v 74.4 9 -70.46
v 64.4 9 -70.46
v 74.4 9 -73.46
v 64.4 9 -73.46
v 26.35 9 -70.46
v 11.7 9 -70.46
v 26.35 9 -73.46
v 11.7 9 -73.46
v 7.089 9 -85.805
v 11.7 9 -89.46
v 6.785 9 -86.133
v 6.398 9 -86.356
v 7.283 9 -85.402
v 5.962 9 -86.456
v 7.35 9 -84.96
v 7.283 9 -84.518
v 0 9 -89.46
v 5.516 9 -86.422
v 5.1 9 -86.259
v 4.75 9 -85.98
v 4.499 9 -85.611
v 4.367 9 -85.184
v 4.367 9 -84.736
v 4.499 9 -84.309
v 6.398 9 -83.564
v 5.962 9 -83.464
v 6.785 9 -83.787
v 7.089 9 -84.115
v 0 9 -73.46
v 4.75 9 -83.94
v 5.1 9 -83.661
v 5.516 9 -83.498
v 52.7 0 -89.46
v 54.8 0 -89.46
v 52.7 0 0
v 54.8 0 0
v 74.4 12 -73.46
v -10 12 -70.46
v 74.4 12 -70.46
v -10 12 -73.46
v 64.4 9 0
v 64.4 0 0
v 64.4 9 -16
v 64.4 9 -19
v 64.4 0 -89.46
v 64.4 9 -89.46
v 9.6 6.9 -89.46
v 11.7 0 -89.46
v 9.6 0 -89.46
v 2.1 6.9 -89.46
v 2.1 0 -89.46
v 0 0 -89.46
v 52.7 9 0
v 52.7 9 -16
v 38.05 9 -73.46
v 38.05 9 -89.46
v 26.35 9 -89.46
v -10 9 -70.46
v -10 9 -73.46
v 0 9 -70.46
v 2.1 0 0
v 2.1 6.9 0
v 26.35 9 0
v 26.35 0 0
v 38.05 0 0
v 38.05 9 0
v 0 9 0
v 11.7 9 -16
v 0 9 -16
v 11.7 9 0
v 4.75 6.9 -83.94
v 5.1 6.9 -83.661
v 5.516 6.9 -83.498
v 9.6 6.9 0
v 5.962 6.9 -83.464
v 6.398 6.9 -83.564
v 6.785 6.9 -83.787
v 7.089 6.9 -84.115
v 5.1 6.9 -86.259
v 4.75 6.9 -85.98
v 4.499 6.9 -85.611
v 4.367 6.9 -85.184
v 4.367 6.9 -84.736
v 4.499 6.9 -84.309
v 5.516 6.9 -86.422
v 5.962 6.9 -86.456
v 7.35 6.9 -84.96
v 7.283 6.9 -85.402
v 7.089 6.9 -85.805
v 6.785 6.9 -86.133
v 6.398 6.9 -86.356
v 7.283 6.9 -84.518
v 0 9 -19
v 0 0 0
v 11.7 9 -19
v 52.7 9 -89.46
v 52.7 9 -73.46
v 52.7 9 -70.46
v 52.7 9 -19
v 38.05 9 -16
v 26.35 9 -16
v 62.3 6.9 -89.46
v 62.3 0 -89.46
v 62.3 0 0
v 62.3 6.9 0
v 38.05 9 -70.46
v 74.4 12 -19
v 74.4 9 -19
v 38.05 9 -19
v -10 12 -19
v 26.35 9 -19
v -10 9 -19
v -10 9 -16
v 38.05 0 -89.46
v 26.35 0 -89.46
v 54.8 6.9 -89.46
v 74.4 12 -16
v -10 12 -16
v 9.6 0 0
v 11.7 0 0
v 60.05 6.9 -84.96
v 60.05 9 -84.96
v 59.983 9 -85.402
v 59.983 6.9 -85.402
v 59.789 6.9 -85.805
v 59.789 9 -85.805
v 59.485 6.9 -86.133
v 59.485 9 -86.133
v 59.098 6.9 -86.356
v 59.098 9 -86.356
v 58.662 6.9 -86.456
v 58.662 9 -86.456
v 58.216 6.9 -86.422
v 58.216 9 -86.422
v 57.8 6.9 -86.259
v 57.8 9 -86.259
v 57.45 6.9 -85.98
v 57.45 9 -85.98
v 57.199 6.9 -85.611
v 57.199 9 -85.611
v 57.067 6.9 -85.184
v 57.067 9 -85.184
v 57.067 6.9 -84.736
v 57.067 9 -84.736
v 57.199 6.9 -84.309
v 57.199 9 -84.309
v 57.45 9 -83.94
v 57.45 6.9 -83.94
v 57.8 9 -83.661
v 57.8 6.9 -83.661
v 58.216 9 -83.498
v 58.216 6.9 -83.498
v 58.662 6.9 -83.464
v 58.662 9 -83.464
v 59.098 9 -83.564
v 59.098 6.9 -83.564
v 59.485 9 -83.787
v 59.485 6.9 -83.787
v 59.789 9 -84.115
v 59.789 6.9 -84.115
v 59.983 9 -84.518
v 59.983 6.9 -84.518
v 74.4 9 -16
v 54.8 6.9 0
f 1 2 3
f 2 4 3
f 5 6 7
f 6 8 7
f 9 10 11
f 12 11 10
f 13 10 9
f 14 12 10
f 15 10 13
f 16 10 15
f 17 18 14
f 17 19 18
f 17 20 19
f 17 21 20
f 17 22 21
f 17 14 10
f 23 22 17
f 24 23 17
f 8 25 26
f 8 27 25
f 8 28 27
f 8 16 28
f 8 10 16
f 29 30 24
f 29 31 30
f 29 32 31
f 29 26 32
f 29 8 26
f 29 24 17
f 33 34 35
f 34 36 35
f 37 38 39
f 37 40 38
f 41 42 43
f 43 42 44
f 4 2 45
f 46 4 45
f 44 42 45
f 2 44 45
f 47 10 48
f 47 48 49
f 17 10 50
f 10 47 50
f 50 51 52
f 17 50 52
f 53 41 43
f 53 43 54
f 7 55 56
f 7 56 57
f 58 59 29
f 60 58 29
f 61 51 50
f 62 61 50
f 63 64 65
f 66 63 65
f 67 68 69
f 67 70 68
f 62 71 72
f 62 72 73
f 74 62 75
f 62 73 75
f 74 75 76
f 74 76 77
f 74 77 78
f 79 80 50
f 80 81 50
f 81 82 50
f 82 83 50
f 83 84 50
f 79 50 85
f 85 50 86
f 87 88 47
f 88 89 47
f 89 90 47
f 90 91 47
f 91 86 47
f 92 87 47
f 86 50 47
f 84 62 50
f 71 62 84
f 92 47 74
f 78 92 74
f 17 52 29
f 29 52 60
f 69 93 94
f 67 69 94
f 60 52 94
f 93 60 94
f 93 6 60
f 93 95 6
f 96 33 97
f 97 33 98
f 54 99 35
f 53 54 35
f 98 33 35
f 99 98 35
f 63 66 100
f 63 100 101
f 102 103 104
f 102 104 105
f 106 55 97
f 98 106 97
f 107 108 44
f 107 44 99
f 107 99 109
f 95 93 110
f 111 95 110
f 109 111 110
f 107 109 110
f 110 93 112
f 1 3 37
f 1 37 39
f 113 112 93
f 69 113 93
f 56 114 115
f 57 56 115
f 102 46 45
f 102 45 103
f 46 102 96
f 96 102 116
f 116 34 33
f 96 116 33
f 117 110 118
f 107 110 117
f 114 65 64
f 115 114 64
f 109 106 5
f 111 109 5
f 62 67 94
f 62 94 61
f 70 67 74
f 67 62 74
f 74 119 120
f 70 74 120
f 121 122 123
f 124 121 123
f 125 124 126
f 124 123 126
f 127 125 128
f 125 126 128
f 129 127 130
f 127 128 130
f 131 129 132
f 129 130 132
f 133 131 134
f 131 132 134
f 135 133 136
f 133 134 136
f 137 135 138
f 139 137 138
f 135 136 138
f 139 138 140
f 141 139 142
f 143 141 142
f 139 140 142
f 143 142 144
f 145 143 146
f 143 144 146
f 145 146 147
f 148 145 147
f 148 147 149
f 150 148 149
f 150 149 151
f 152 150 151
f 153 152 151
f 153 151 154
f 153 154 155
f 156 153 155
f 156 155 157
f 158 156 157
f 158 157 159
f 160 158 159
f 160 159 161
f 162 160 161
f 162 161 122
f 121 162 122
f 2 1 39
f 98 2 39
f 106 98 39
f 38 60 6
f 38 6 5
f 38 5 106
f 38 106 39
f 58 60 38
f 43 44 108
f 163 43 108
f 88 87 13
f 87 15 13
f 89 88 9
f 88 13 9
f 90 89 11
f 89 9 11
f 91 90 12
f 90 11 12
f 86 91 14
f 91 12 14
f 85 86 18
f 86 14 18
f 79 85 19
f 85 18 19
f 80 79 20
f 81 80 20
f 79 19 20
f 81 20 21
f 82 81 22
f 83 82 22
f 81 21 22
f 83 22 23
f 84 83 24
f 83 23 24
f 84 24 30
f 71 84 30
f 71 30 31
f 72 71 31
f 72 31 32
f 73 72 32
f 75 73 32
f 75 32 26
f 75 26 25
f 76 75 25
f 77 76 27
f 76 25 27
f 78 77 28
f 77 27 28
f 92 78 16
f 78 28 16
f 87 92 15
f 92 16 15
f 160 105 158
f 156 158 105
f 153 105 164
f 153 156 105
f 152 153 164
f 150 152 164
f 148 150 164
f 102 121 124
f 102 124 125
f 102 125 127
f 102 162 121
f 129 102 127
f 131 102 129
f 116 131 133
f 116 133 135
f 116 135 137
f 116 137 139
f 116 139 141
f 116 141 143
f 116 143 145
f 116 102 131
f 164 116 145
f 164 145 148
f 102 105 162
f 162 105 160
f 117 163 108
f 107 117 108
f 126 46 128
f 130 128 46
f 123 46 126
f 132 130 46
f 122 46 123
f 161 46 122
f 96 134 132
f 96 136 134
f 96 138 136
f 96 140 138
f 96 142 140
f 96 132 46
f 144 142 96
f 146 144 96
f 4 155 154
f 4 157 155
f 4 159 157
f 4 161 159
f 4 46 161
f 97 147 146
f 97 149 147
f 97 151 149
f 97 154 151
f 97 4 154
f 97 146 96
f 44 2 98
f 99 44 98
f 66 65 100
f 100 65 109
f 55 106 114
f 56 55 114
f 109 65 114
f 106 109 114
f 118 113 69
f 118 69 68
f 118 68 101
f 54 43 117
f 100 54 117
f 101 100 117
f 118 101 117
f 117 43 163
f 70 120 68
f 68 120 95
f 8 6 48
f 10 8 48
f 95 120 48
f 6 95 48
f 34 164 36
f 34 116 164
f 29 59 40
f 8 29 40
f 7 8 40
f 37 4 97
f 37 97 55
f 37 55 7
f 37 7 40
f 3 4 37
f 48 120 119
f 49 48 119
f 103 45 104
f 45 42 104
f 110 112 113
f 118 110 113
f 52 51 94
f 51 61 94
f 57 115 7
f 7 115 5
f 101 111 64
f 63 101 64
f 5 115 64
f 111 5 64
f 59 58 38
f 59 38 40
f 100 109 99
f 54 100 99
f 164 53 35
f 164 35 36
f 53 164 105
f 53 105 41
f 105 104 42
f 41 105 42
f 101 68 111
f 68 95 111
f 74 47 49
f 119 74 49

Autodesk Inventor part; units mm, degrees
ref_plane "YZ Plane" through (0, 0, 0) normal (1, 0, 0) x (0, 1, 0)
ref_plane "XZ Plane" through (0, 0, 0) normal (0, 1, 0) x (-1, 0, 0)
sketch "Sketch1" plane through (0, 0, 0) normal (0, 1, 0) x (-1, 0, 0)
  line L0 (0, 0) -> (-11.7, 0)
  line L1 (-11.7, 0) -> (-11.7, -89.46)
  line L2 (-11.7, -89.46) -> (0, -89.46)
  line L3 (0, -89.46) -> (0, 0)
  line L4 (-26.35, 0) -> (-38.05, 0)
  line L5 (-38.05, 0) -> (-38.05, -89.46)
  line L6 (-38.05, -89.46) -> (-26.35, -89.46)
  line L7 (-26.35, -89.46) -> (-26.35, 0)
  line L8 (-52.7, 0) -> (-64.4, 0)
  line L9 (-64.4, 0) -> (-64.4, -89.46)
  line L10 (-64.4, -89.46) -> (-52.7, -89.46)
  line L11 (-52.7, -89.46) -> (-52.7, 0)
  dimension "d0" = 11.7
  dimension "d1" = 11.7
  dimension "d2" = 11.7
  dimension "d3" = 14.65
  dimension "d4" = 14.65
  dimension "d5" = 89.46
  dimension "d47" = 64.4
extrude "Extrusion1" add sketch "Sketch1" along normal blind 9
sketch "Sketch2" plane through (0, 9, 0) normal (0, 1, 0) x (1, 0, 0)
  line L0 (38.05, 89.46) -> (26.35, 89.46) construction
  line L1 (32.2, 89.46) -> (32.2, 0) construction
  line L2 (26.35, 0) -> (38.05, 0) construction
  line L3 (11.7, 89.46) -> (0, 89.46) construction
  line L4 (5.85, 89.46) -> (5.85, 0) construction
  line L5 (0, 0) -> (11.7, 0) construction
  circle A0 centre (5.85, 84.96) radius 1.5
  circle A1 centre (58.55, 84.96) radius 1.5
  dimension "d8" = 3
  dimension "d9" = 4.5
extrude "Extrusion2" cut sketch "Sketch2" against normal blind 8
sketch "Sketch3" plane through (11.7, 0, -89.46) normal (0, 0, -1) x (-1, 0, 0)
  line L0 (-14.65, 9) -> (-26.35, 9) construction
  line L1 (-20.5, 9) -> (-20.5, 0) construction
  line L2 (-14.65, 0) -> (-26.35, 0) construction
  line L3 (0, 0) -> (11.7, 0) projected
  line L4 (9.6, 0) -> (9.6, 6.9)
  line L5 (9.6, 6.9) -> (2.1, 6.9)
  line L6 (2.1, 6.9) -> (2.1, 0)
  line L7 (2.1, 0) -> (9.6, 0) construction
  line L8 (0, 0) -> (0, 9) construction
  line L9 (11.7, 0) -> (11.7, 9) construction
  line L10 (-41, 0) -> (-52.7, 0)
  line L11 (-50.6, 0) -> (-50.6, 6.9)
  line L12 (-50.6, 6.9) -> (-43.1, 6.9)
  line L13 (-43.1, 6.9) -> (-43.1, 0)
  dimension "d15" = 7.5
  dimension "d16" = 2.1
  dimension "d17" = 2.1
  dimension "d18" = 6.9
extrude "Extrusion3" cut sketch "Sketch3" against normal through all
sketch "Sketch4" plane through (0, 9, 0) normal (0, 1, 0) x (1, 0, 0)
  line L0 (0, 89.46) -> (0, 0) construction
  line L1 (0, 44.73) -> (64.4, 44.73) construction
  line L2 (64.4, 0) -> (64.4, 89.46) construction
  line L3 (-10, 16) -> (74.4, 16)
  line L4 (74.4, 16) -> (74.4, 19)
  line L5 (74.4, 19) -> (-10, 19)
  line L6 (-10, 19) -> (-10, 16)
  line L7 (-10, 73.46) -> (74.4, 73.46)
  line L8 (74.4, 73.46) -> (74.4, 70.46)
  line L9 (74.4, 70.46) -> (-10, 70.46)
  line L10 (-10, 70.46) -> (-10, 73.46)
  line L11 (52.7, 0) -> (64.4, 0) projected
  dimension "d21" = 3
  dimension "d22" = 10
  dimension "d23" = 10
  dimension "d46" = 16
extrude "Extrusion4" add sketch "Sketch4" along normal blind 3
ref_plane "Work Plane2" through (32.2, 0, -89.46) normal (-1, 0, 0) x (0, 0, 1)
sketch "Sketch5" plane through (0, 8.5, 0) normal (0, -1, 0) x (1, 0, 0)
  line L0 (23, -75) -> (14, -75)
  line L1 (14, -75) -> (14, -22)
  line L2 (14, -22) -> (23, -22)
  line L3 (23, -22) -> (23, -75)
  line L4 (26, -90) -> (26, 0) projected
  line L5 (11, 0) -> (11, -90) projected
  line L6 (11, -22) -> (26, -22) projected
  line L7 (11, -68) -> (26, -68) projected
  point P0 (0, 0)
  point P1 (18.5, -22)
  dimension "d27" = 3
  dimension "d28" = 3
  dimension "d29" = 9
  dimension "d30" = 7
sketch "Sketch6" plane through (23, 8.5, -75) normal (0, 0, -1) x (-1, 0, 0)
  line L0 (9, 0) -> (9, -2) projected
  line L1 (0, 0) -> (0, -2) projected
  line L2 (9, -0.5) -> (0, -0.5)
  line L3 (0, -0.5) -> (0, -1.5)
  line L4 (0, -1.5) -> (9, -1.5)
  line L5 (9, -1.5) -> (9, -0.5)
  line L6 (9, 0) -> (0, 0) projected
  line L7 (9, -2) -> (0, -2) projected
  point P0 (23, -8.5)
  dimension "d34" = 0.5
  dimension "d35" = 0.5
  dimension "d36" = 1
sketch "Sketch7" plane through (14, 8, -75) normal (0, 1, 0) x (1, 0, 0)
  line L0 (1.5, 2) -> (7.5, 2)
  line L1 (7.5, 2) -> (7.5, 4.5)
  line L2 (7.5, 4.5) -> (1.5, 4.5)
  line L3 (1.5, 4.5) -> (1.5, 2)
  line L4 (0, 0) -> (0, 7) projected
  line L5 (9, 0) -> (9, 7) projected
  line L6 (0, 7) -> (9, 7) projected
  point P0 (-14, -75)
  dimension "d39" = 6
  dimension "d40" = 2.5
  dimension "d41" = 1.5
  dimension "d42" = 1.5
  dimension "d43" = 2.5
equation "\"d1\" = d0"
equation "\"d2\" = d1"
equation "\"d4\" = d3"
equation "\"d17\" = d16"
equation "\"d23\" = d22"
equation "\"d28\" = d27"
equation "\"d35\" = d34"
equation "\"d42\" = d41"
properties part number "tracks"
